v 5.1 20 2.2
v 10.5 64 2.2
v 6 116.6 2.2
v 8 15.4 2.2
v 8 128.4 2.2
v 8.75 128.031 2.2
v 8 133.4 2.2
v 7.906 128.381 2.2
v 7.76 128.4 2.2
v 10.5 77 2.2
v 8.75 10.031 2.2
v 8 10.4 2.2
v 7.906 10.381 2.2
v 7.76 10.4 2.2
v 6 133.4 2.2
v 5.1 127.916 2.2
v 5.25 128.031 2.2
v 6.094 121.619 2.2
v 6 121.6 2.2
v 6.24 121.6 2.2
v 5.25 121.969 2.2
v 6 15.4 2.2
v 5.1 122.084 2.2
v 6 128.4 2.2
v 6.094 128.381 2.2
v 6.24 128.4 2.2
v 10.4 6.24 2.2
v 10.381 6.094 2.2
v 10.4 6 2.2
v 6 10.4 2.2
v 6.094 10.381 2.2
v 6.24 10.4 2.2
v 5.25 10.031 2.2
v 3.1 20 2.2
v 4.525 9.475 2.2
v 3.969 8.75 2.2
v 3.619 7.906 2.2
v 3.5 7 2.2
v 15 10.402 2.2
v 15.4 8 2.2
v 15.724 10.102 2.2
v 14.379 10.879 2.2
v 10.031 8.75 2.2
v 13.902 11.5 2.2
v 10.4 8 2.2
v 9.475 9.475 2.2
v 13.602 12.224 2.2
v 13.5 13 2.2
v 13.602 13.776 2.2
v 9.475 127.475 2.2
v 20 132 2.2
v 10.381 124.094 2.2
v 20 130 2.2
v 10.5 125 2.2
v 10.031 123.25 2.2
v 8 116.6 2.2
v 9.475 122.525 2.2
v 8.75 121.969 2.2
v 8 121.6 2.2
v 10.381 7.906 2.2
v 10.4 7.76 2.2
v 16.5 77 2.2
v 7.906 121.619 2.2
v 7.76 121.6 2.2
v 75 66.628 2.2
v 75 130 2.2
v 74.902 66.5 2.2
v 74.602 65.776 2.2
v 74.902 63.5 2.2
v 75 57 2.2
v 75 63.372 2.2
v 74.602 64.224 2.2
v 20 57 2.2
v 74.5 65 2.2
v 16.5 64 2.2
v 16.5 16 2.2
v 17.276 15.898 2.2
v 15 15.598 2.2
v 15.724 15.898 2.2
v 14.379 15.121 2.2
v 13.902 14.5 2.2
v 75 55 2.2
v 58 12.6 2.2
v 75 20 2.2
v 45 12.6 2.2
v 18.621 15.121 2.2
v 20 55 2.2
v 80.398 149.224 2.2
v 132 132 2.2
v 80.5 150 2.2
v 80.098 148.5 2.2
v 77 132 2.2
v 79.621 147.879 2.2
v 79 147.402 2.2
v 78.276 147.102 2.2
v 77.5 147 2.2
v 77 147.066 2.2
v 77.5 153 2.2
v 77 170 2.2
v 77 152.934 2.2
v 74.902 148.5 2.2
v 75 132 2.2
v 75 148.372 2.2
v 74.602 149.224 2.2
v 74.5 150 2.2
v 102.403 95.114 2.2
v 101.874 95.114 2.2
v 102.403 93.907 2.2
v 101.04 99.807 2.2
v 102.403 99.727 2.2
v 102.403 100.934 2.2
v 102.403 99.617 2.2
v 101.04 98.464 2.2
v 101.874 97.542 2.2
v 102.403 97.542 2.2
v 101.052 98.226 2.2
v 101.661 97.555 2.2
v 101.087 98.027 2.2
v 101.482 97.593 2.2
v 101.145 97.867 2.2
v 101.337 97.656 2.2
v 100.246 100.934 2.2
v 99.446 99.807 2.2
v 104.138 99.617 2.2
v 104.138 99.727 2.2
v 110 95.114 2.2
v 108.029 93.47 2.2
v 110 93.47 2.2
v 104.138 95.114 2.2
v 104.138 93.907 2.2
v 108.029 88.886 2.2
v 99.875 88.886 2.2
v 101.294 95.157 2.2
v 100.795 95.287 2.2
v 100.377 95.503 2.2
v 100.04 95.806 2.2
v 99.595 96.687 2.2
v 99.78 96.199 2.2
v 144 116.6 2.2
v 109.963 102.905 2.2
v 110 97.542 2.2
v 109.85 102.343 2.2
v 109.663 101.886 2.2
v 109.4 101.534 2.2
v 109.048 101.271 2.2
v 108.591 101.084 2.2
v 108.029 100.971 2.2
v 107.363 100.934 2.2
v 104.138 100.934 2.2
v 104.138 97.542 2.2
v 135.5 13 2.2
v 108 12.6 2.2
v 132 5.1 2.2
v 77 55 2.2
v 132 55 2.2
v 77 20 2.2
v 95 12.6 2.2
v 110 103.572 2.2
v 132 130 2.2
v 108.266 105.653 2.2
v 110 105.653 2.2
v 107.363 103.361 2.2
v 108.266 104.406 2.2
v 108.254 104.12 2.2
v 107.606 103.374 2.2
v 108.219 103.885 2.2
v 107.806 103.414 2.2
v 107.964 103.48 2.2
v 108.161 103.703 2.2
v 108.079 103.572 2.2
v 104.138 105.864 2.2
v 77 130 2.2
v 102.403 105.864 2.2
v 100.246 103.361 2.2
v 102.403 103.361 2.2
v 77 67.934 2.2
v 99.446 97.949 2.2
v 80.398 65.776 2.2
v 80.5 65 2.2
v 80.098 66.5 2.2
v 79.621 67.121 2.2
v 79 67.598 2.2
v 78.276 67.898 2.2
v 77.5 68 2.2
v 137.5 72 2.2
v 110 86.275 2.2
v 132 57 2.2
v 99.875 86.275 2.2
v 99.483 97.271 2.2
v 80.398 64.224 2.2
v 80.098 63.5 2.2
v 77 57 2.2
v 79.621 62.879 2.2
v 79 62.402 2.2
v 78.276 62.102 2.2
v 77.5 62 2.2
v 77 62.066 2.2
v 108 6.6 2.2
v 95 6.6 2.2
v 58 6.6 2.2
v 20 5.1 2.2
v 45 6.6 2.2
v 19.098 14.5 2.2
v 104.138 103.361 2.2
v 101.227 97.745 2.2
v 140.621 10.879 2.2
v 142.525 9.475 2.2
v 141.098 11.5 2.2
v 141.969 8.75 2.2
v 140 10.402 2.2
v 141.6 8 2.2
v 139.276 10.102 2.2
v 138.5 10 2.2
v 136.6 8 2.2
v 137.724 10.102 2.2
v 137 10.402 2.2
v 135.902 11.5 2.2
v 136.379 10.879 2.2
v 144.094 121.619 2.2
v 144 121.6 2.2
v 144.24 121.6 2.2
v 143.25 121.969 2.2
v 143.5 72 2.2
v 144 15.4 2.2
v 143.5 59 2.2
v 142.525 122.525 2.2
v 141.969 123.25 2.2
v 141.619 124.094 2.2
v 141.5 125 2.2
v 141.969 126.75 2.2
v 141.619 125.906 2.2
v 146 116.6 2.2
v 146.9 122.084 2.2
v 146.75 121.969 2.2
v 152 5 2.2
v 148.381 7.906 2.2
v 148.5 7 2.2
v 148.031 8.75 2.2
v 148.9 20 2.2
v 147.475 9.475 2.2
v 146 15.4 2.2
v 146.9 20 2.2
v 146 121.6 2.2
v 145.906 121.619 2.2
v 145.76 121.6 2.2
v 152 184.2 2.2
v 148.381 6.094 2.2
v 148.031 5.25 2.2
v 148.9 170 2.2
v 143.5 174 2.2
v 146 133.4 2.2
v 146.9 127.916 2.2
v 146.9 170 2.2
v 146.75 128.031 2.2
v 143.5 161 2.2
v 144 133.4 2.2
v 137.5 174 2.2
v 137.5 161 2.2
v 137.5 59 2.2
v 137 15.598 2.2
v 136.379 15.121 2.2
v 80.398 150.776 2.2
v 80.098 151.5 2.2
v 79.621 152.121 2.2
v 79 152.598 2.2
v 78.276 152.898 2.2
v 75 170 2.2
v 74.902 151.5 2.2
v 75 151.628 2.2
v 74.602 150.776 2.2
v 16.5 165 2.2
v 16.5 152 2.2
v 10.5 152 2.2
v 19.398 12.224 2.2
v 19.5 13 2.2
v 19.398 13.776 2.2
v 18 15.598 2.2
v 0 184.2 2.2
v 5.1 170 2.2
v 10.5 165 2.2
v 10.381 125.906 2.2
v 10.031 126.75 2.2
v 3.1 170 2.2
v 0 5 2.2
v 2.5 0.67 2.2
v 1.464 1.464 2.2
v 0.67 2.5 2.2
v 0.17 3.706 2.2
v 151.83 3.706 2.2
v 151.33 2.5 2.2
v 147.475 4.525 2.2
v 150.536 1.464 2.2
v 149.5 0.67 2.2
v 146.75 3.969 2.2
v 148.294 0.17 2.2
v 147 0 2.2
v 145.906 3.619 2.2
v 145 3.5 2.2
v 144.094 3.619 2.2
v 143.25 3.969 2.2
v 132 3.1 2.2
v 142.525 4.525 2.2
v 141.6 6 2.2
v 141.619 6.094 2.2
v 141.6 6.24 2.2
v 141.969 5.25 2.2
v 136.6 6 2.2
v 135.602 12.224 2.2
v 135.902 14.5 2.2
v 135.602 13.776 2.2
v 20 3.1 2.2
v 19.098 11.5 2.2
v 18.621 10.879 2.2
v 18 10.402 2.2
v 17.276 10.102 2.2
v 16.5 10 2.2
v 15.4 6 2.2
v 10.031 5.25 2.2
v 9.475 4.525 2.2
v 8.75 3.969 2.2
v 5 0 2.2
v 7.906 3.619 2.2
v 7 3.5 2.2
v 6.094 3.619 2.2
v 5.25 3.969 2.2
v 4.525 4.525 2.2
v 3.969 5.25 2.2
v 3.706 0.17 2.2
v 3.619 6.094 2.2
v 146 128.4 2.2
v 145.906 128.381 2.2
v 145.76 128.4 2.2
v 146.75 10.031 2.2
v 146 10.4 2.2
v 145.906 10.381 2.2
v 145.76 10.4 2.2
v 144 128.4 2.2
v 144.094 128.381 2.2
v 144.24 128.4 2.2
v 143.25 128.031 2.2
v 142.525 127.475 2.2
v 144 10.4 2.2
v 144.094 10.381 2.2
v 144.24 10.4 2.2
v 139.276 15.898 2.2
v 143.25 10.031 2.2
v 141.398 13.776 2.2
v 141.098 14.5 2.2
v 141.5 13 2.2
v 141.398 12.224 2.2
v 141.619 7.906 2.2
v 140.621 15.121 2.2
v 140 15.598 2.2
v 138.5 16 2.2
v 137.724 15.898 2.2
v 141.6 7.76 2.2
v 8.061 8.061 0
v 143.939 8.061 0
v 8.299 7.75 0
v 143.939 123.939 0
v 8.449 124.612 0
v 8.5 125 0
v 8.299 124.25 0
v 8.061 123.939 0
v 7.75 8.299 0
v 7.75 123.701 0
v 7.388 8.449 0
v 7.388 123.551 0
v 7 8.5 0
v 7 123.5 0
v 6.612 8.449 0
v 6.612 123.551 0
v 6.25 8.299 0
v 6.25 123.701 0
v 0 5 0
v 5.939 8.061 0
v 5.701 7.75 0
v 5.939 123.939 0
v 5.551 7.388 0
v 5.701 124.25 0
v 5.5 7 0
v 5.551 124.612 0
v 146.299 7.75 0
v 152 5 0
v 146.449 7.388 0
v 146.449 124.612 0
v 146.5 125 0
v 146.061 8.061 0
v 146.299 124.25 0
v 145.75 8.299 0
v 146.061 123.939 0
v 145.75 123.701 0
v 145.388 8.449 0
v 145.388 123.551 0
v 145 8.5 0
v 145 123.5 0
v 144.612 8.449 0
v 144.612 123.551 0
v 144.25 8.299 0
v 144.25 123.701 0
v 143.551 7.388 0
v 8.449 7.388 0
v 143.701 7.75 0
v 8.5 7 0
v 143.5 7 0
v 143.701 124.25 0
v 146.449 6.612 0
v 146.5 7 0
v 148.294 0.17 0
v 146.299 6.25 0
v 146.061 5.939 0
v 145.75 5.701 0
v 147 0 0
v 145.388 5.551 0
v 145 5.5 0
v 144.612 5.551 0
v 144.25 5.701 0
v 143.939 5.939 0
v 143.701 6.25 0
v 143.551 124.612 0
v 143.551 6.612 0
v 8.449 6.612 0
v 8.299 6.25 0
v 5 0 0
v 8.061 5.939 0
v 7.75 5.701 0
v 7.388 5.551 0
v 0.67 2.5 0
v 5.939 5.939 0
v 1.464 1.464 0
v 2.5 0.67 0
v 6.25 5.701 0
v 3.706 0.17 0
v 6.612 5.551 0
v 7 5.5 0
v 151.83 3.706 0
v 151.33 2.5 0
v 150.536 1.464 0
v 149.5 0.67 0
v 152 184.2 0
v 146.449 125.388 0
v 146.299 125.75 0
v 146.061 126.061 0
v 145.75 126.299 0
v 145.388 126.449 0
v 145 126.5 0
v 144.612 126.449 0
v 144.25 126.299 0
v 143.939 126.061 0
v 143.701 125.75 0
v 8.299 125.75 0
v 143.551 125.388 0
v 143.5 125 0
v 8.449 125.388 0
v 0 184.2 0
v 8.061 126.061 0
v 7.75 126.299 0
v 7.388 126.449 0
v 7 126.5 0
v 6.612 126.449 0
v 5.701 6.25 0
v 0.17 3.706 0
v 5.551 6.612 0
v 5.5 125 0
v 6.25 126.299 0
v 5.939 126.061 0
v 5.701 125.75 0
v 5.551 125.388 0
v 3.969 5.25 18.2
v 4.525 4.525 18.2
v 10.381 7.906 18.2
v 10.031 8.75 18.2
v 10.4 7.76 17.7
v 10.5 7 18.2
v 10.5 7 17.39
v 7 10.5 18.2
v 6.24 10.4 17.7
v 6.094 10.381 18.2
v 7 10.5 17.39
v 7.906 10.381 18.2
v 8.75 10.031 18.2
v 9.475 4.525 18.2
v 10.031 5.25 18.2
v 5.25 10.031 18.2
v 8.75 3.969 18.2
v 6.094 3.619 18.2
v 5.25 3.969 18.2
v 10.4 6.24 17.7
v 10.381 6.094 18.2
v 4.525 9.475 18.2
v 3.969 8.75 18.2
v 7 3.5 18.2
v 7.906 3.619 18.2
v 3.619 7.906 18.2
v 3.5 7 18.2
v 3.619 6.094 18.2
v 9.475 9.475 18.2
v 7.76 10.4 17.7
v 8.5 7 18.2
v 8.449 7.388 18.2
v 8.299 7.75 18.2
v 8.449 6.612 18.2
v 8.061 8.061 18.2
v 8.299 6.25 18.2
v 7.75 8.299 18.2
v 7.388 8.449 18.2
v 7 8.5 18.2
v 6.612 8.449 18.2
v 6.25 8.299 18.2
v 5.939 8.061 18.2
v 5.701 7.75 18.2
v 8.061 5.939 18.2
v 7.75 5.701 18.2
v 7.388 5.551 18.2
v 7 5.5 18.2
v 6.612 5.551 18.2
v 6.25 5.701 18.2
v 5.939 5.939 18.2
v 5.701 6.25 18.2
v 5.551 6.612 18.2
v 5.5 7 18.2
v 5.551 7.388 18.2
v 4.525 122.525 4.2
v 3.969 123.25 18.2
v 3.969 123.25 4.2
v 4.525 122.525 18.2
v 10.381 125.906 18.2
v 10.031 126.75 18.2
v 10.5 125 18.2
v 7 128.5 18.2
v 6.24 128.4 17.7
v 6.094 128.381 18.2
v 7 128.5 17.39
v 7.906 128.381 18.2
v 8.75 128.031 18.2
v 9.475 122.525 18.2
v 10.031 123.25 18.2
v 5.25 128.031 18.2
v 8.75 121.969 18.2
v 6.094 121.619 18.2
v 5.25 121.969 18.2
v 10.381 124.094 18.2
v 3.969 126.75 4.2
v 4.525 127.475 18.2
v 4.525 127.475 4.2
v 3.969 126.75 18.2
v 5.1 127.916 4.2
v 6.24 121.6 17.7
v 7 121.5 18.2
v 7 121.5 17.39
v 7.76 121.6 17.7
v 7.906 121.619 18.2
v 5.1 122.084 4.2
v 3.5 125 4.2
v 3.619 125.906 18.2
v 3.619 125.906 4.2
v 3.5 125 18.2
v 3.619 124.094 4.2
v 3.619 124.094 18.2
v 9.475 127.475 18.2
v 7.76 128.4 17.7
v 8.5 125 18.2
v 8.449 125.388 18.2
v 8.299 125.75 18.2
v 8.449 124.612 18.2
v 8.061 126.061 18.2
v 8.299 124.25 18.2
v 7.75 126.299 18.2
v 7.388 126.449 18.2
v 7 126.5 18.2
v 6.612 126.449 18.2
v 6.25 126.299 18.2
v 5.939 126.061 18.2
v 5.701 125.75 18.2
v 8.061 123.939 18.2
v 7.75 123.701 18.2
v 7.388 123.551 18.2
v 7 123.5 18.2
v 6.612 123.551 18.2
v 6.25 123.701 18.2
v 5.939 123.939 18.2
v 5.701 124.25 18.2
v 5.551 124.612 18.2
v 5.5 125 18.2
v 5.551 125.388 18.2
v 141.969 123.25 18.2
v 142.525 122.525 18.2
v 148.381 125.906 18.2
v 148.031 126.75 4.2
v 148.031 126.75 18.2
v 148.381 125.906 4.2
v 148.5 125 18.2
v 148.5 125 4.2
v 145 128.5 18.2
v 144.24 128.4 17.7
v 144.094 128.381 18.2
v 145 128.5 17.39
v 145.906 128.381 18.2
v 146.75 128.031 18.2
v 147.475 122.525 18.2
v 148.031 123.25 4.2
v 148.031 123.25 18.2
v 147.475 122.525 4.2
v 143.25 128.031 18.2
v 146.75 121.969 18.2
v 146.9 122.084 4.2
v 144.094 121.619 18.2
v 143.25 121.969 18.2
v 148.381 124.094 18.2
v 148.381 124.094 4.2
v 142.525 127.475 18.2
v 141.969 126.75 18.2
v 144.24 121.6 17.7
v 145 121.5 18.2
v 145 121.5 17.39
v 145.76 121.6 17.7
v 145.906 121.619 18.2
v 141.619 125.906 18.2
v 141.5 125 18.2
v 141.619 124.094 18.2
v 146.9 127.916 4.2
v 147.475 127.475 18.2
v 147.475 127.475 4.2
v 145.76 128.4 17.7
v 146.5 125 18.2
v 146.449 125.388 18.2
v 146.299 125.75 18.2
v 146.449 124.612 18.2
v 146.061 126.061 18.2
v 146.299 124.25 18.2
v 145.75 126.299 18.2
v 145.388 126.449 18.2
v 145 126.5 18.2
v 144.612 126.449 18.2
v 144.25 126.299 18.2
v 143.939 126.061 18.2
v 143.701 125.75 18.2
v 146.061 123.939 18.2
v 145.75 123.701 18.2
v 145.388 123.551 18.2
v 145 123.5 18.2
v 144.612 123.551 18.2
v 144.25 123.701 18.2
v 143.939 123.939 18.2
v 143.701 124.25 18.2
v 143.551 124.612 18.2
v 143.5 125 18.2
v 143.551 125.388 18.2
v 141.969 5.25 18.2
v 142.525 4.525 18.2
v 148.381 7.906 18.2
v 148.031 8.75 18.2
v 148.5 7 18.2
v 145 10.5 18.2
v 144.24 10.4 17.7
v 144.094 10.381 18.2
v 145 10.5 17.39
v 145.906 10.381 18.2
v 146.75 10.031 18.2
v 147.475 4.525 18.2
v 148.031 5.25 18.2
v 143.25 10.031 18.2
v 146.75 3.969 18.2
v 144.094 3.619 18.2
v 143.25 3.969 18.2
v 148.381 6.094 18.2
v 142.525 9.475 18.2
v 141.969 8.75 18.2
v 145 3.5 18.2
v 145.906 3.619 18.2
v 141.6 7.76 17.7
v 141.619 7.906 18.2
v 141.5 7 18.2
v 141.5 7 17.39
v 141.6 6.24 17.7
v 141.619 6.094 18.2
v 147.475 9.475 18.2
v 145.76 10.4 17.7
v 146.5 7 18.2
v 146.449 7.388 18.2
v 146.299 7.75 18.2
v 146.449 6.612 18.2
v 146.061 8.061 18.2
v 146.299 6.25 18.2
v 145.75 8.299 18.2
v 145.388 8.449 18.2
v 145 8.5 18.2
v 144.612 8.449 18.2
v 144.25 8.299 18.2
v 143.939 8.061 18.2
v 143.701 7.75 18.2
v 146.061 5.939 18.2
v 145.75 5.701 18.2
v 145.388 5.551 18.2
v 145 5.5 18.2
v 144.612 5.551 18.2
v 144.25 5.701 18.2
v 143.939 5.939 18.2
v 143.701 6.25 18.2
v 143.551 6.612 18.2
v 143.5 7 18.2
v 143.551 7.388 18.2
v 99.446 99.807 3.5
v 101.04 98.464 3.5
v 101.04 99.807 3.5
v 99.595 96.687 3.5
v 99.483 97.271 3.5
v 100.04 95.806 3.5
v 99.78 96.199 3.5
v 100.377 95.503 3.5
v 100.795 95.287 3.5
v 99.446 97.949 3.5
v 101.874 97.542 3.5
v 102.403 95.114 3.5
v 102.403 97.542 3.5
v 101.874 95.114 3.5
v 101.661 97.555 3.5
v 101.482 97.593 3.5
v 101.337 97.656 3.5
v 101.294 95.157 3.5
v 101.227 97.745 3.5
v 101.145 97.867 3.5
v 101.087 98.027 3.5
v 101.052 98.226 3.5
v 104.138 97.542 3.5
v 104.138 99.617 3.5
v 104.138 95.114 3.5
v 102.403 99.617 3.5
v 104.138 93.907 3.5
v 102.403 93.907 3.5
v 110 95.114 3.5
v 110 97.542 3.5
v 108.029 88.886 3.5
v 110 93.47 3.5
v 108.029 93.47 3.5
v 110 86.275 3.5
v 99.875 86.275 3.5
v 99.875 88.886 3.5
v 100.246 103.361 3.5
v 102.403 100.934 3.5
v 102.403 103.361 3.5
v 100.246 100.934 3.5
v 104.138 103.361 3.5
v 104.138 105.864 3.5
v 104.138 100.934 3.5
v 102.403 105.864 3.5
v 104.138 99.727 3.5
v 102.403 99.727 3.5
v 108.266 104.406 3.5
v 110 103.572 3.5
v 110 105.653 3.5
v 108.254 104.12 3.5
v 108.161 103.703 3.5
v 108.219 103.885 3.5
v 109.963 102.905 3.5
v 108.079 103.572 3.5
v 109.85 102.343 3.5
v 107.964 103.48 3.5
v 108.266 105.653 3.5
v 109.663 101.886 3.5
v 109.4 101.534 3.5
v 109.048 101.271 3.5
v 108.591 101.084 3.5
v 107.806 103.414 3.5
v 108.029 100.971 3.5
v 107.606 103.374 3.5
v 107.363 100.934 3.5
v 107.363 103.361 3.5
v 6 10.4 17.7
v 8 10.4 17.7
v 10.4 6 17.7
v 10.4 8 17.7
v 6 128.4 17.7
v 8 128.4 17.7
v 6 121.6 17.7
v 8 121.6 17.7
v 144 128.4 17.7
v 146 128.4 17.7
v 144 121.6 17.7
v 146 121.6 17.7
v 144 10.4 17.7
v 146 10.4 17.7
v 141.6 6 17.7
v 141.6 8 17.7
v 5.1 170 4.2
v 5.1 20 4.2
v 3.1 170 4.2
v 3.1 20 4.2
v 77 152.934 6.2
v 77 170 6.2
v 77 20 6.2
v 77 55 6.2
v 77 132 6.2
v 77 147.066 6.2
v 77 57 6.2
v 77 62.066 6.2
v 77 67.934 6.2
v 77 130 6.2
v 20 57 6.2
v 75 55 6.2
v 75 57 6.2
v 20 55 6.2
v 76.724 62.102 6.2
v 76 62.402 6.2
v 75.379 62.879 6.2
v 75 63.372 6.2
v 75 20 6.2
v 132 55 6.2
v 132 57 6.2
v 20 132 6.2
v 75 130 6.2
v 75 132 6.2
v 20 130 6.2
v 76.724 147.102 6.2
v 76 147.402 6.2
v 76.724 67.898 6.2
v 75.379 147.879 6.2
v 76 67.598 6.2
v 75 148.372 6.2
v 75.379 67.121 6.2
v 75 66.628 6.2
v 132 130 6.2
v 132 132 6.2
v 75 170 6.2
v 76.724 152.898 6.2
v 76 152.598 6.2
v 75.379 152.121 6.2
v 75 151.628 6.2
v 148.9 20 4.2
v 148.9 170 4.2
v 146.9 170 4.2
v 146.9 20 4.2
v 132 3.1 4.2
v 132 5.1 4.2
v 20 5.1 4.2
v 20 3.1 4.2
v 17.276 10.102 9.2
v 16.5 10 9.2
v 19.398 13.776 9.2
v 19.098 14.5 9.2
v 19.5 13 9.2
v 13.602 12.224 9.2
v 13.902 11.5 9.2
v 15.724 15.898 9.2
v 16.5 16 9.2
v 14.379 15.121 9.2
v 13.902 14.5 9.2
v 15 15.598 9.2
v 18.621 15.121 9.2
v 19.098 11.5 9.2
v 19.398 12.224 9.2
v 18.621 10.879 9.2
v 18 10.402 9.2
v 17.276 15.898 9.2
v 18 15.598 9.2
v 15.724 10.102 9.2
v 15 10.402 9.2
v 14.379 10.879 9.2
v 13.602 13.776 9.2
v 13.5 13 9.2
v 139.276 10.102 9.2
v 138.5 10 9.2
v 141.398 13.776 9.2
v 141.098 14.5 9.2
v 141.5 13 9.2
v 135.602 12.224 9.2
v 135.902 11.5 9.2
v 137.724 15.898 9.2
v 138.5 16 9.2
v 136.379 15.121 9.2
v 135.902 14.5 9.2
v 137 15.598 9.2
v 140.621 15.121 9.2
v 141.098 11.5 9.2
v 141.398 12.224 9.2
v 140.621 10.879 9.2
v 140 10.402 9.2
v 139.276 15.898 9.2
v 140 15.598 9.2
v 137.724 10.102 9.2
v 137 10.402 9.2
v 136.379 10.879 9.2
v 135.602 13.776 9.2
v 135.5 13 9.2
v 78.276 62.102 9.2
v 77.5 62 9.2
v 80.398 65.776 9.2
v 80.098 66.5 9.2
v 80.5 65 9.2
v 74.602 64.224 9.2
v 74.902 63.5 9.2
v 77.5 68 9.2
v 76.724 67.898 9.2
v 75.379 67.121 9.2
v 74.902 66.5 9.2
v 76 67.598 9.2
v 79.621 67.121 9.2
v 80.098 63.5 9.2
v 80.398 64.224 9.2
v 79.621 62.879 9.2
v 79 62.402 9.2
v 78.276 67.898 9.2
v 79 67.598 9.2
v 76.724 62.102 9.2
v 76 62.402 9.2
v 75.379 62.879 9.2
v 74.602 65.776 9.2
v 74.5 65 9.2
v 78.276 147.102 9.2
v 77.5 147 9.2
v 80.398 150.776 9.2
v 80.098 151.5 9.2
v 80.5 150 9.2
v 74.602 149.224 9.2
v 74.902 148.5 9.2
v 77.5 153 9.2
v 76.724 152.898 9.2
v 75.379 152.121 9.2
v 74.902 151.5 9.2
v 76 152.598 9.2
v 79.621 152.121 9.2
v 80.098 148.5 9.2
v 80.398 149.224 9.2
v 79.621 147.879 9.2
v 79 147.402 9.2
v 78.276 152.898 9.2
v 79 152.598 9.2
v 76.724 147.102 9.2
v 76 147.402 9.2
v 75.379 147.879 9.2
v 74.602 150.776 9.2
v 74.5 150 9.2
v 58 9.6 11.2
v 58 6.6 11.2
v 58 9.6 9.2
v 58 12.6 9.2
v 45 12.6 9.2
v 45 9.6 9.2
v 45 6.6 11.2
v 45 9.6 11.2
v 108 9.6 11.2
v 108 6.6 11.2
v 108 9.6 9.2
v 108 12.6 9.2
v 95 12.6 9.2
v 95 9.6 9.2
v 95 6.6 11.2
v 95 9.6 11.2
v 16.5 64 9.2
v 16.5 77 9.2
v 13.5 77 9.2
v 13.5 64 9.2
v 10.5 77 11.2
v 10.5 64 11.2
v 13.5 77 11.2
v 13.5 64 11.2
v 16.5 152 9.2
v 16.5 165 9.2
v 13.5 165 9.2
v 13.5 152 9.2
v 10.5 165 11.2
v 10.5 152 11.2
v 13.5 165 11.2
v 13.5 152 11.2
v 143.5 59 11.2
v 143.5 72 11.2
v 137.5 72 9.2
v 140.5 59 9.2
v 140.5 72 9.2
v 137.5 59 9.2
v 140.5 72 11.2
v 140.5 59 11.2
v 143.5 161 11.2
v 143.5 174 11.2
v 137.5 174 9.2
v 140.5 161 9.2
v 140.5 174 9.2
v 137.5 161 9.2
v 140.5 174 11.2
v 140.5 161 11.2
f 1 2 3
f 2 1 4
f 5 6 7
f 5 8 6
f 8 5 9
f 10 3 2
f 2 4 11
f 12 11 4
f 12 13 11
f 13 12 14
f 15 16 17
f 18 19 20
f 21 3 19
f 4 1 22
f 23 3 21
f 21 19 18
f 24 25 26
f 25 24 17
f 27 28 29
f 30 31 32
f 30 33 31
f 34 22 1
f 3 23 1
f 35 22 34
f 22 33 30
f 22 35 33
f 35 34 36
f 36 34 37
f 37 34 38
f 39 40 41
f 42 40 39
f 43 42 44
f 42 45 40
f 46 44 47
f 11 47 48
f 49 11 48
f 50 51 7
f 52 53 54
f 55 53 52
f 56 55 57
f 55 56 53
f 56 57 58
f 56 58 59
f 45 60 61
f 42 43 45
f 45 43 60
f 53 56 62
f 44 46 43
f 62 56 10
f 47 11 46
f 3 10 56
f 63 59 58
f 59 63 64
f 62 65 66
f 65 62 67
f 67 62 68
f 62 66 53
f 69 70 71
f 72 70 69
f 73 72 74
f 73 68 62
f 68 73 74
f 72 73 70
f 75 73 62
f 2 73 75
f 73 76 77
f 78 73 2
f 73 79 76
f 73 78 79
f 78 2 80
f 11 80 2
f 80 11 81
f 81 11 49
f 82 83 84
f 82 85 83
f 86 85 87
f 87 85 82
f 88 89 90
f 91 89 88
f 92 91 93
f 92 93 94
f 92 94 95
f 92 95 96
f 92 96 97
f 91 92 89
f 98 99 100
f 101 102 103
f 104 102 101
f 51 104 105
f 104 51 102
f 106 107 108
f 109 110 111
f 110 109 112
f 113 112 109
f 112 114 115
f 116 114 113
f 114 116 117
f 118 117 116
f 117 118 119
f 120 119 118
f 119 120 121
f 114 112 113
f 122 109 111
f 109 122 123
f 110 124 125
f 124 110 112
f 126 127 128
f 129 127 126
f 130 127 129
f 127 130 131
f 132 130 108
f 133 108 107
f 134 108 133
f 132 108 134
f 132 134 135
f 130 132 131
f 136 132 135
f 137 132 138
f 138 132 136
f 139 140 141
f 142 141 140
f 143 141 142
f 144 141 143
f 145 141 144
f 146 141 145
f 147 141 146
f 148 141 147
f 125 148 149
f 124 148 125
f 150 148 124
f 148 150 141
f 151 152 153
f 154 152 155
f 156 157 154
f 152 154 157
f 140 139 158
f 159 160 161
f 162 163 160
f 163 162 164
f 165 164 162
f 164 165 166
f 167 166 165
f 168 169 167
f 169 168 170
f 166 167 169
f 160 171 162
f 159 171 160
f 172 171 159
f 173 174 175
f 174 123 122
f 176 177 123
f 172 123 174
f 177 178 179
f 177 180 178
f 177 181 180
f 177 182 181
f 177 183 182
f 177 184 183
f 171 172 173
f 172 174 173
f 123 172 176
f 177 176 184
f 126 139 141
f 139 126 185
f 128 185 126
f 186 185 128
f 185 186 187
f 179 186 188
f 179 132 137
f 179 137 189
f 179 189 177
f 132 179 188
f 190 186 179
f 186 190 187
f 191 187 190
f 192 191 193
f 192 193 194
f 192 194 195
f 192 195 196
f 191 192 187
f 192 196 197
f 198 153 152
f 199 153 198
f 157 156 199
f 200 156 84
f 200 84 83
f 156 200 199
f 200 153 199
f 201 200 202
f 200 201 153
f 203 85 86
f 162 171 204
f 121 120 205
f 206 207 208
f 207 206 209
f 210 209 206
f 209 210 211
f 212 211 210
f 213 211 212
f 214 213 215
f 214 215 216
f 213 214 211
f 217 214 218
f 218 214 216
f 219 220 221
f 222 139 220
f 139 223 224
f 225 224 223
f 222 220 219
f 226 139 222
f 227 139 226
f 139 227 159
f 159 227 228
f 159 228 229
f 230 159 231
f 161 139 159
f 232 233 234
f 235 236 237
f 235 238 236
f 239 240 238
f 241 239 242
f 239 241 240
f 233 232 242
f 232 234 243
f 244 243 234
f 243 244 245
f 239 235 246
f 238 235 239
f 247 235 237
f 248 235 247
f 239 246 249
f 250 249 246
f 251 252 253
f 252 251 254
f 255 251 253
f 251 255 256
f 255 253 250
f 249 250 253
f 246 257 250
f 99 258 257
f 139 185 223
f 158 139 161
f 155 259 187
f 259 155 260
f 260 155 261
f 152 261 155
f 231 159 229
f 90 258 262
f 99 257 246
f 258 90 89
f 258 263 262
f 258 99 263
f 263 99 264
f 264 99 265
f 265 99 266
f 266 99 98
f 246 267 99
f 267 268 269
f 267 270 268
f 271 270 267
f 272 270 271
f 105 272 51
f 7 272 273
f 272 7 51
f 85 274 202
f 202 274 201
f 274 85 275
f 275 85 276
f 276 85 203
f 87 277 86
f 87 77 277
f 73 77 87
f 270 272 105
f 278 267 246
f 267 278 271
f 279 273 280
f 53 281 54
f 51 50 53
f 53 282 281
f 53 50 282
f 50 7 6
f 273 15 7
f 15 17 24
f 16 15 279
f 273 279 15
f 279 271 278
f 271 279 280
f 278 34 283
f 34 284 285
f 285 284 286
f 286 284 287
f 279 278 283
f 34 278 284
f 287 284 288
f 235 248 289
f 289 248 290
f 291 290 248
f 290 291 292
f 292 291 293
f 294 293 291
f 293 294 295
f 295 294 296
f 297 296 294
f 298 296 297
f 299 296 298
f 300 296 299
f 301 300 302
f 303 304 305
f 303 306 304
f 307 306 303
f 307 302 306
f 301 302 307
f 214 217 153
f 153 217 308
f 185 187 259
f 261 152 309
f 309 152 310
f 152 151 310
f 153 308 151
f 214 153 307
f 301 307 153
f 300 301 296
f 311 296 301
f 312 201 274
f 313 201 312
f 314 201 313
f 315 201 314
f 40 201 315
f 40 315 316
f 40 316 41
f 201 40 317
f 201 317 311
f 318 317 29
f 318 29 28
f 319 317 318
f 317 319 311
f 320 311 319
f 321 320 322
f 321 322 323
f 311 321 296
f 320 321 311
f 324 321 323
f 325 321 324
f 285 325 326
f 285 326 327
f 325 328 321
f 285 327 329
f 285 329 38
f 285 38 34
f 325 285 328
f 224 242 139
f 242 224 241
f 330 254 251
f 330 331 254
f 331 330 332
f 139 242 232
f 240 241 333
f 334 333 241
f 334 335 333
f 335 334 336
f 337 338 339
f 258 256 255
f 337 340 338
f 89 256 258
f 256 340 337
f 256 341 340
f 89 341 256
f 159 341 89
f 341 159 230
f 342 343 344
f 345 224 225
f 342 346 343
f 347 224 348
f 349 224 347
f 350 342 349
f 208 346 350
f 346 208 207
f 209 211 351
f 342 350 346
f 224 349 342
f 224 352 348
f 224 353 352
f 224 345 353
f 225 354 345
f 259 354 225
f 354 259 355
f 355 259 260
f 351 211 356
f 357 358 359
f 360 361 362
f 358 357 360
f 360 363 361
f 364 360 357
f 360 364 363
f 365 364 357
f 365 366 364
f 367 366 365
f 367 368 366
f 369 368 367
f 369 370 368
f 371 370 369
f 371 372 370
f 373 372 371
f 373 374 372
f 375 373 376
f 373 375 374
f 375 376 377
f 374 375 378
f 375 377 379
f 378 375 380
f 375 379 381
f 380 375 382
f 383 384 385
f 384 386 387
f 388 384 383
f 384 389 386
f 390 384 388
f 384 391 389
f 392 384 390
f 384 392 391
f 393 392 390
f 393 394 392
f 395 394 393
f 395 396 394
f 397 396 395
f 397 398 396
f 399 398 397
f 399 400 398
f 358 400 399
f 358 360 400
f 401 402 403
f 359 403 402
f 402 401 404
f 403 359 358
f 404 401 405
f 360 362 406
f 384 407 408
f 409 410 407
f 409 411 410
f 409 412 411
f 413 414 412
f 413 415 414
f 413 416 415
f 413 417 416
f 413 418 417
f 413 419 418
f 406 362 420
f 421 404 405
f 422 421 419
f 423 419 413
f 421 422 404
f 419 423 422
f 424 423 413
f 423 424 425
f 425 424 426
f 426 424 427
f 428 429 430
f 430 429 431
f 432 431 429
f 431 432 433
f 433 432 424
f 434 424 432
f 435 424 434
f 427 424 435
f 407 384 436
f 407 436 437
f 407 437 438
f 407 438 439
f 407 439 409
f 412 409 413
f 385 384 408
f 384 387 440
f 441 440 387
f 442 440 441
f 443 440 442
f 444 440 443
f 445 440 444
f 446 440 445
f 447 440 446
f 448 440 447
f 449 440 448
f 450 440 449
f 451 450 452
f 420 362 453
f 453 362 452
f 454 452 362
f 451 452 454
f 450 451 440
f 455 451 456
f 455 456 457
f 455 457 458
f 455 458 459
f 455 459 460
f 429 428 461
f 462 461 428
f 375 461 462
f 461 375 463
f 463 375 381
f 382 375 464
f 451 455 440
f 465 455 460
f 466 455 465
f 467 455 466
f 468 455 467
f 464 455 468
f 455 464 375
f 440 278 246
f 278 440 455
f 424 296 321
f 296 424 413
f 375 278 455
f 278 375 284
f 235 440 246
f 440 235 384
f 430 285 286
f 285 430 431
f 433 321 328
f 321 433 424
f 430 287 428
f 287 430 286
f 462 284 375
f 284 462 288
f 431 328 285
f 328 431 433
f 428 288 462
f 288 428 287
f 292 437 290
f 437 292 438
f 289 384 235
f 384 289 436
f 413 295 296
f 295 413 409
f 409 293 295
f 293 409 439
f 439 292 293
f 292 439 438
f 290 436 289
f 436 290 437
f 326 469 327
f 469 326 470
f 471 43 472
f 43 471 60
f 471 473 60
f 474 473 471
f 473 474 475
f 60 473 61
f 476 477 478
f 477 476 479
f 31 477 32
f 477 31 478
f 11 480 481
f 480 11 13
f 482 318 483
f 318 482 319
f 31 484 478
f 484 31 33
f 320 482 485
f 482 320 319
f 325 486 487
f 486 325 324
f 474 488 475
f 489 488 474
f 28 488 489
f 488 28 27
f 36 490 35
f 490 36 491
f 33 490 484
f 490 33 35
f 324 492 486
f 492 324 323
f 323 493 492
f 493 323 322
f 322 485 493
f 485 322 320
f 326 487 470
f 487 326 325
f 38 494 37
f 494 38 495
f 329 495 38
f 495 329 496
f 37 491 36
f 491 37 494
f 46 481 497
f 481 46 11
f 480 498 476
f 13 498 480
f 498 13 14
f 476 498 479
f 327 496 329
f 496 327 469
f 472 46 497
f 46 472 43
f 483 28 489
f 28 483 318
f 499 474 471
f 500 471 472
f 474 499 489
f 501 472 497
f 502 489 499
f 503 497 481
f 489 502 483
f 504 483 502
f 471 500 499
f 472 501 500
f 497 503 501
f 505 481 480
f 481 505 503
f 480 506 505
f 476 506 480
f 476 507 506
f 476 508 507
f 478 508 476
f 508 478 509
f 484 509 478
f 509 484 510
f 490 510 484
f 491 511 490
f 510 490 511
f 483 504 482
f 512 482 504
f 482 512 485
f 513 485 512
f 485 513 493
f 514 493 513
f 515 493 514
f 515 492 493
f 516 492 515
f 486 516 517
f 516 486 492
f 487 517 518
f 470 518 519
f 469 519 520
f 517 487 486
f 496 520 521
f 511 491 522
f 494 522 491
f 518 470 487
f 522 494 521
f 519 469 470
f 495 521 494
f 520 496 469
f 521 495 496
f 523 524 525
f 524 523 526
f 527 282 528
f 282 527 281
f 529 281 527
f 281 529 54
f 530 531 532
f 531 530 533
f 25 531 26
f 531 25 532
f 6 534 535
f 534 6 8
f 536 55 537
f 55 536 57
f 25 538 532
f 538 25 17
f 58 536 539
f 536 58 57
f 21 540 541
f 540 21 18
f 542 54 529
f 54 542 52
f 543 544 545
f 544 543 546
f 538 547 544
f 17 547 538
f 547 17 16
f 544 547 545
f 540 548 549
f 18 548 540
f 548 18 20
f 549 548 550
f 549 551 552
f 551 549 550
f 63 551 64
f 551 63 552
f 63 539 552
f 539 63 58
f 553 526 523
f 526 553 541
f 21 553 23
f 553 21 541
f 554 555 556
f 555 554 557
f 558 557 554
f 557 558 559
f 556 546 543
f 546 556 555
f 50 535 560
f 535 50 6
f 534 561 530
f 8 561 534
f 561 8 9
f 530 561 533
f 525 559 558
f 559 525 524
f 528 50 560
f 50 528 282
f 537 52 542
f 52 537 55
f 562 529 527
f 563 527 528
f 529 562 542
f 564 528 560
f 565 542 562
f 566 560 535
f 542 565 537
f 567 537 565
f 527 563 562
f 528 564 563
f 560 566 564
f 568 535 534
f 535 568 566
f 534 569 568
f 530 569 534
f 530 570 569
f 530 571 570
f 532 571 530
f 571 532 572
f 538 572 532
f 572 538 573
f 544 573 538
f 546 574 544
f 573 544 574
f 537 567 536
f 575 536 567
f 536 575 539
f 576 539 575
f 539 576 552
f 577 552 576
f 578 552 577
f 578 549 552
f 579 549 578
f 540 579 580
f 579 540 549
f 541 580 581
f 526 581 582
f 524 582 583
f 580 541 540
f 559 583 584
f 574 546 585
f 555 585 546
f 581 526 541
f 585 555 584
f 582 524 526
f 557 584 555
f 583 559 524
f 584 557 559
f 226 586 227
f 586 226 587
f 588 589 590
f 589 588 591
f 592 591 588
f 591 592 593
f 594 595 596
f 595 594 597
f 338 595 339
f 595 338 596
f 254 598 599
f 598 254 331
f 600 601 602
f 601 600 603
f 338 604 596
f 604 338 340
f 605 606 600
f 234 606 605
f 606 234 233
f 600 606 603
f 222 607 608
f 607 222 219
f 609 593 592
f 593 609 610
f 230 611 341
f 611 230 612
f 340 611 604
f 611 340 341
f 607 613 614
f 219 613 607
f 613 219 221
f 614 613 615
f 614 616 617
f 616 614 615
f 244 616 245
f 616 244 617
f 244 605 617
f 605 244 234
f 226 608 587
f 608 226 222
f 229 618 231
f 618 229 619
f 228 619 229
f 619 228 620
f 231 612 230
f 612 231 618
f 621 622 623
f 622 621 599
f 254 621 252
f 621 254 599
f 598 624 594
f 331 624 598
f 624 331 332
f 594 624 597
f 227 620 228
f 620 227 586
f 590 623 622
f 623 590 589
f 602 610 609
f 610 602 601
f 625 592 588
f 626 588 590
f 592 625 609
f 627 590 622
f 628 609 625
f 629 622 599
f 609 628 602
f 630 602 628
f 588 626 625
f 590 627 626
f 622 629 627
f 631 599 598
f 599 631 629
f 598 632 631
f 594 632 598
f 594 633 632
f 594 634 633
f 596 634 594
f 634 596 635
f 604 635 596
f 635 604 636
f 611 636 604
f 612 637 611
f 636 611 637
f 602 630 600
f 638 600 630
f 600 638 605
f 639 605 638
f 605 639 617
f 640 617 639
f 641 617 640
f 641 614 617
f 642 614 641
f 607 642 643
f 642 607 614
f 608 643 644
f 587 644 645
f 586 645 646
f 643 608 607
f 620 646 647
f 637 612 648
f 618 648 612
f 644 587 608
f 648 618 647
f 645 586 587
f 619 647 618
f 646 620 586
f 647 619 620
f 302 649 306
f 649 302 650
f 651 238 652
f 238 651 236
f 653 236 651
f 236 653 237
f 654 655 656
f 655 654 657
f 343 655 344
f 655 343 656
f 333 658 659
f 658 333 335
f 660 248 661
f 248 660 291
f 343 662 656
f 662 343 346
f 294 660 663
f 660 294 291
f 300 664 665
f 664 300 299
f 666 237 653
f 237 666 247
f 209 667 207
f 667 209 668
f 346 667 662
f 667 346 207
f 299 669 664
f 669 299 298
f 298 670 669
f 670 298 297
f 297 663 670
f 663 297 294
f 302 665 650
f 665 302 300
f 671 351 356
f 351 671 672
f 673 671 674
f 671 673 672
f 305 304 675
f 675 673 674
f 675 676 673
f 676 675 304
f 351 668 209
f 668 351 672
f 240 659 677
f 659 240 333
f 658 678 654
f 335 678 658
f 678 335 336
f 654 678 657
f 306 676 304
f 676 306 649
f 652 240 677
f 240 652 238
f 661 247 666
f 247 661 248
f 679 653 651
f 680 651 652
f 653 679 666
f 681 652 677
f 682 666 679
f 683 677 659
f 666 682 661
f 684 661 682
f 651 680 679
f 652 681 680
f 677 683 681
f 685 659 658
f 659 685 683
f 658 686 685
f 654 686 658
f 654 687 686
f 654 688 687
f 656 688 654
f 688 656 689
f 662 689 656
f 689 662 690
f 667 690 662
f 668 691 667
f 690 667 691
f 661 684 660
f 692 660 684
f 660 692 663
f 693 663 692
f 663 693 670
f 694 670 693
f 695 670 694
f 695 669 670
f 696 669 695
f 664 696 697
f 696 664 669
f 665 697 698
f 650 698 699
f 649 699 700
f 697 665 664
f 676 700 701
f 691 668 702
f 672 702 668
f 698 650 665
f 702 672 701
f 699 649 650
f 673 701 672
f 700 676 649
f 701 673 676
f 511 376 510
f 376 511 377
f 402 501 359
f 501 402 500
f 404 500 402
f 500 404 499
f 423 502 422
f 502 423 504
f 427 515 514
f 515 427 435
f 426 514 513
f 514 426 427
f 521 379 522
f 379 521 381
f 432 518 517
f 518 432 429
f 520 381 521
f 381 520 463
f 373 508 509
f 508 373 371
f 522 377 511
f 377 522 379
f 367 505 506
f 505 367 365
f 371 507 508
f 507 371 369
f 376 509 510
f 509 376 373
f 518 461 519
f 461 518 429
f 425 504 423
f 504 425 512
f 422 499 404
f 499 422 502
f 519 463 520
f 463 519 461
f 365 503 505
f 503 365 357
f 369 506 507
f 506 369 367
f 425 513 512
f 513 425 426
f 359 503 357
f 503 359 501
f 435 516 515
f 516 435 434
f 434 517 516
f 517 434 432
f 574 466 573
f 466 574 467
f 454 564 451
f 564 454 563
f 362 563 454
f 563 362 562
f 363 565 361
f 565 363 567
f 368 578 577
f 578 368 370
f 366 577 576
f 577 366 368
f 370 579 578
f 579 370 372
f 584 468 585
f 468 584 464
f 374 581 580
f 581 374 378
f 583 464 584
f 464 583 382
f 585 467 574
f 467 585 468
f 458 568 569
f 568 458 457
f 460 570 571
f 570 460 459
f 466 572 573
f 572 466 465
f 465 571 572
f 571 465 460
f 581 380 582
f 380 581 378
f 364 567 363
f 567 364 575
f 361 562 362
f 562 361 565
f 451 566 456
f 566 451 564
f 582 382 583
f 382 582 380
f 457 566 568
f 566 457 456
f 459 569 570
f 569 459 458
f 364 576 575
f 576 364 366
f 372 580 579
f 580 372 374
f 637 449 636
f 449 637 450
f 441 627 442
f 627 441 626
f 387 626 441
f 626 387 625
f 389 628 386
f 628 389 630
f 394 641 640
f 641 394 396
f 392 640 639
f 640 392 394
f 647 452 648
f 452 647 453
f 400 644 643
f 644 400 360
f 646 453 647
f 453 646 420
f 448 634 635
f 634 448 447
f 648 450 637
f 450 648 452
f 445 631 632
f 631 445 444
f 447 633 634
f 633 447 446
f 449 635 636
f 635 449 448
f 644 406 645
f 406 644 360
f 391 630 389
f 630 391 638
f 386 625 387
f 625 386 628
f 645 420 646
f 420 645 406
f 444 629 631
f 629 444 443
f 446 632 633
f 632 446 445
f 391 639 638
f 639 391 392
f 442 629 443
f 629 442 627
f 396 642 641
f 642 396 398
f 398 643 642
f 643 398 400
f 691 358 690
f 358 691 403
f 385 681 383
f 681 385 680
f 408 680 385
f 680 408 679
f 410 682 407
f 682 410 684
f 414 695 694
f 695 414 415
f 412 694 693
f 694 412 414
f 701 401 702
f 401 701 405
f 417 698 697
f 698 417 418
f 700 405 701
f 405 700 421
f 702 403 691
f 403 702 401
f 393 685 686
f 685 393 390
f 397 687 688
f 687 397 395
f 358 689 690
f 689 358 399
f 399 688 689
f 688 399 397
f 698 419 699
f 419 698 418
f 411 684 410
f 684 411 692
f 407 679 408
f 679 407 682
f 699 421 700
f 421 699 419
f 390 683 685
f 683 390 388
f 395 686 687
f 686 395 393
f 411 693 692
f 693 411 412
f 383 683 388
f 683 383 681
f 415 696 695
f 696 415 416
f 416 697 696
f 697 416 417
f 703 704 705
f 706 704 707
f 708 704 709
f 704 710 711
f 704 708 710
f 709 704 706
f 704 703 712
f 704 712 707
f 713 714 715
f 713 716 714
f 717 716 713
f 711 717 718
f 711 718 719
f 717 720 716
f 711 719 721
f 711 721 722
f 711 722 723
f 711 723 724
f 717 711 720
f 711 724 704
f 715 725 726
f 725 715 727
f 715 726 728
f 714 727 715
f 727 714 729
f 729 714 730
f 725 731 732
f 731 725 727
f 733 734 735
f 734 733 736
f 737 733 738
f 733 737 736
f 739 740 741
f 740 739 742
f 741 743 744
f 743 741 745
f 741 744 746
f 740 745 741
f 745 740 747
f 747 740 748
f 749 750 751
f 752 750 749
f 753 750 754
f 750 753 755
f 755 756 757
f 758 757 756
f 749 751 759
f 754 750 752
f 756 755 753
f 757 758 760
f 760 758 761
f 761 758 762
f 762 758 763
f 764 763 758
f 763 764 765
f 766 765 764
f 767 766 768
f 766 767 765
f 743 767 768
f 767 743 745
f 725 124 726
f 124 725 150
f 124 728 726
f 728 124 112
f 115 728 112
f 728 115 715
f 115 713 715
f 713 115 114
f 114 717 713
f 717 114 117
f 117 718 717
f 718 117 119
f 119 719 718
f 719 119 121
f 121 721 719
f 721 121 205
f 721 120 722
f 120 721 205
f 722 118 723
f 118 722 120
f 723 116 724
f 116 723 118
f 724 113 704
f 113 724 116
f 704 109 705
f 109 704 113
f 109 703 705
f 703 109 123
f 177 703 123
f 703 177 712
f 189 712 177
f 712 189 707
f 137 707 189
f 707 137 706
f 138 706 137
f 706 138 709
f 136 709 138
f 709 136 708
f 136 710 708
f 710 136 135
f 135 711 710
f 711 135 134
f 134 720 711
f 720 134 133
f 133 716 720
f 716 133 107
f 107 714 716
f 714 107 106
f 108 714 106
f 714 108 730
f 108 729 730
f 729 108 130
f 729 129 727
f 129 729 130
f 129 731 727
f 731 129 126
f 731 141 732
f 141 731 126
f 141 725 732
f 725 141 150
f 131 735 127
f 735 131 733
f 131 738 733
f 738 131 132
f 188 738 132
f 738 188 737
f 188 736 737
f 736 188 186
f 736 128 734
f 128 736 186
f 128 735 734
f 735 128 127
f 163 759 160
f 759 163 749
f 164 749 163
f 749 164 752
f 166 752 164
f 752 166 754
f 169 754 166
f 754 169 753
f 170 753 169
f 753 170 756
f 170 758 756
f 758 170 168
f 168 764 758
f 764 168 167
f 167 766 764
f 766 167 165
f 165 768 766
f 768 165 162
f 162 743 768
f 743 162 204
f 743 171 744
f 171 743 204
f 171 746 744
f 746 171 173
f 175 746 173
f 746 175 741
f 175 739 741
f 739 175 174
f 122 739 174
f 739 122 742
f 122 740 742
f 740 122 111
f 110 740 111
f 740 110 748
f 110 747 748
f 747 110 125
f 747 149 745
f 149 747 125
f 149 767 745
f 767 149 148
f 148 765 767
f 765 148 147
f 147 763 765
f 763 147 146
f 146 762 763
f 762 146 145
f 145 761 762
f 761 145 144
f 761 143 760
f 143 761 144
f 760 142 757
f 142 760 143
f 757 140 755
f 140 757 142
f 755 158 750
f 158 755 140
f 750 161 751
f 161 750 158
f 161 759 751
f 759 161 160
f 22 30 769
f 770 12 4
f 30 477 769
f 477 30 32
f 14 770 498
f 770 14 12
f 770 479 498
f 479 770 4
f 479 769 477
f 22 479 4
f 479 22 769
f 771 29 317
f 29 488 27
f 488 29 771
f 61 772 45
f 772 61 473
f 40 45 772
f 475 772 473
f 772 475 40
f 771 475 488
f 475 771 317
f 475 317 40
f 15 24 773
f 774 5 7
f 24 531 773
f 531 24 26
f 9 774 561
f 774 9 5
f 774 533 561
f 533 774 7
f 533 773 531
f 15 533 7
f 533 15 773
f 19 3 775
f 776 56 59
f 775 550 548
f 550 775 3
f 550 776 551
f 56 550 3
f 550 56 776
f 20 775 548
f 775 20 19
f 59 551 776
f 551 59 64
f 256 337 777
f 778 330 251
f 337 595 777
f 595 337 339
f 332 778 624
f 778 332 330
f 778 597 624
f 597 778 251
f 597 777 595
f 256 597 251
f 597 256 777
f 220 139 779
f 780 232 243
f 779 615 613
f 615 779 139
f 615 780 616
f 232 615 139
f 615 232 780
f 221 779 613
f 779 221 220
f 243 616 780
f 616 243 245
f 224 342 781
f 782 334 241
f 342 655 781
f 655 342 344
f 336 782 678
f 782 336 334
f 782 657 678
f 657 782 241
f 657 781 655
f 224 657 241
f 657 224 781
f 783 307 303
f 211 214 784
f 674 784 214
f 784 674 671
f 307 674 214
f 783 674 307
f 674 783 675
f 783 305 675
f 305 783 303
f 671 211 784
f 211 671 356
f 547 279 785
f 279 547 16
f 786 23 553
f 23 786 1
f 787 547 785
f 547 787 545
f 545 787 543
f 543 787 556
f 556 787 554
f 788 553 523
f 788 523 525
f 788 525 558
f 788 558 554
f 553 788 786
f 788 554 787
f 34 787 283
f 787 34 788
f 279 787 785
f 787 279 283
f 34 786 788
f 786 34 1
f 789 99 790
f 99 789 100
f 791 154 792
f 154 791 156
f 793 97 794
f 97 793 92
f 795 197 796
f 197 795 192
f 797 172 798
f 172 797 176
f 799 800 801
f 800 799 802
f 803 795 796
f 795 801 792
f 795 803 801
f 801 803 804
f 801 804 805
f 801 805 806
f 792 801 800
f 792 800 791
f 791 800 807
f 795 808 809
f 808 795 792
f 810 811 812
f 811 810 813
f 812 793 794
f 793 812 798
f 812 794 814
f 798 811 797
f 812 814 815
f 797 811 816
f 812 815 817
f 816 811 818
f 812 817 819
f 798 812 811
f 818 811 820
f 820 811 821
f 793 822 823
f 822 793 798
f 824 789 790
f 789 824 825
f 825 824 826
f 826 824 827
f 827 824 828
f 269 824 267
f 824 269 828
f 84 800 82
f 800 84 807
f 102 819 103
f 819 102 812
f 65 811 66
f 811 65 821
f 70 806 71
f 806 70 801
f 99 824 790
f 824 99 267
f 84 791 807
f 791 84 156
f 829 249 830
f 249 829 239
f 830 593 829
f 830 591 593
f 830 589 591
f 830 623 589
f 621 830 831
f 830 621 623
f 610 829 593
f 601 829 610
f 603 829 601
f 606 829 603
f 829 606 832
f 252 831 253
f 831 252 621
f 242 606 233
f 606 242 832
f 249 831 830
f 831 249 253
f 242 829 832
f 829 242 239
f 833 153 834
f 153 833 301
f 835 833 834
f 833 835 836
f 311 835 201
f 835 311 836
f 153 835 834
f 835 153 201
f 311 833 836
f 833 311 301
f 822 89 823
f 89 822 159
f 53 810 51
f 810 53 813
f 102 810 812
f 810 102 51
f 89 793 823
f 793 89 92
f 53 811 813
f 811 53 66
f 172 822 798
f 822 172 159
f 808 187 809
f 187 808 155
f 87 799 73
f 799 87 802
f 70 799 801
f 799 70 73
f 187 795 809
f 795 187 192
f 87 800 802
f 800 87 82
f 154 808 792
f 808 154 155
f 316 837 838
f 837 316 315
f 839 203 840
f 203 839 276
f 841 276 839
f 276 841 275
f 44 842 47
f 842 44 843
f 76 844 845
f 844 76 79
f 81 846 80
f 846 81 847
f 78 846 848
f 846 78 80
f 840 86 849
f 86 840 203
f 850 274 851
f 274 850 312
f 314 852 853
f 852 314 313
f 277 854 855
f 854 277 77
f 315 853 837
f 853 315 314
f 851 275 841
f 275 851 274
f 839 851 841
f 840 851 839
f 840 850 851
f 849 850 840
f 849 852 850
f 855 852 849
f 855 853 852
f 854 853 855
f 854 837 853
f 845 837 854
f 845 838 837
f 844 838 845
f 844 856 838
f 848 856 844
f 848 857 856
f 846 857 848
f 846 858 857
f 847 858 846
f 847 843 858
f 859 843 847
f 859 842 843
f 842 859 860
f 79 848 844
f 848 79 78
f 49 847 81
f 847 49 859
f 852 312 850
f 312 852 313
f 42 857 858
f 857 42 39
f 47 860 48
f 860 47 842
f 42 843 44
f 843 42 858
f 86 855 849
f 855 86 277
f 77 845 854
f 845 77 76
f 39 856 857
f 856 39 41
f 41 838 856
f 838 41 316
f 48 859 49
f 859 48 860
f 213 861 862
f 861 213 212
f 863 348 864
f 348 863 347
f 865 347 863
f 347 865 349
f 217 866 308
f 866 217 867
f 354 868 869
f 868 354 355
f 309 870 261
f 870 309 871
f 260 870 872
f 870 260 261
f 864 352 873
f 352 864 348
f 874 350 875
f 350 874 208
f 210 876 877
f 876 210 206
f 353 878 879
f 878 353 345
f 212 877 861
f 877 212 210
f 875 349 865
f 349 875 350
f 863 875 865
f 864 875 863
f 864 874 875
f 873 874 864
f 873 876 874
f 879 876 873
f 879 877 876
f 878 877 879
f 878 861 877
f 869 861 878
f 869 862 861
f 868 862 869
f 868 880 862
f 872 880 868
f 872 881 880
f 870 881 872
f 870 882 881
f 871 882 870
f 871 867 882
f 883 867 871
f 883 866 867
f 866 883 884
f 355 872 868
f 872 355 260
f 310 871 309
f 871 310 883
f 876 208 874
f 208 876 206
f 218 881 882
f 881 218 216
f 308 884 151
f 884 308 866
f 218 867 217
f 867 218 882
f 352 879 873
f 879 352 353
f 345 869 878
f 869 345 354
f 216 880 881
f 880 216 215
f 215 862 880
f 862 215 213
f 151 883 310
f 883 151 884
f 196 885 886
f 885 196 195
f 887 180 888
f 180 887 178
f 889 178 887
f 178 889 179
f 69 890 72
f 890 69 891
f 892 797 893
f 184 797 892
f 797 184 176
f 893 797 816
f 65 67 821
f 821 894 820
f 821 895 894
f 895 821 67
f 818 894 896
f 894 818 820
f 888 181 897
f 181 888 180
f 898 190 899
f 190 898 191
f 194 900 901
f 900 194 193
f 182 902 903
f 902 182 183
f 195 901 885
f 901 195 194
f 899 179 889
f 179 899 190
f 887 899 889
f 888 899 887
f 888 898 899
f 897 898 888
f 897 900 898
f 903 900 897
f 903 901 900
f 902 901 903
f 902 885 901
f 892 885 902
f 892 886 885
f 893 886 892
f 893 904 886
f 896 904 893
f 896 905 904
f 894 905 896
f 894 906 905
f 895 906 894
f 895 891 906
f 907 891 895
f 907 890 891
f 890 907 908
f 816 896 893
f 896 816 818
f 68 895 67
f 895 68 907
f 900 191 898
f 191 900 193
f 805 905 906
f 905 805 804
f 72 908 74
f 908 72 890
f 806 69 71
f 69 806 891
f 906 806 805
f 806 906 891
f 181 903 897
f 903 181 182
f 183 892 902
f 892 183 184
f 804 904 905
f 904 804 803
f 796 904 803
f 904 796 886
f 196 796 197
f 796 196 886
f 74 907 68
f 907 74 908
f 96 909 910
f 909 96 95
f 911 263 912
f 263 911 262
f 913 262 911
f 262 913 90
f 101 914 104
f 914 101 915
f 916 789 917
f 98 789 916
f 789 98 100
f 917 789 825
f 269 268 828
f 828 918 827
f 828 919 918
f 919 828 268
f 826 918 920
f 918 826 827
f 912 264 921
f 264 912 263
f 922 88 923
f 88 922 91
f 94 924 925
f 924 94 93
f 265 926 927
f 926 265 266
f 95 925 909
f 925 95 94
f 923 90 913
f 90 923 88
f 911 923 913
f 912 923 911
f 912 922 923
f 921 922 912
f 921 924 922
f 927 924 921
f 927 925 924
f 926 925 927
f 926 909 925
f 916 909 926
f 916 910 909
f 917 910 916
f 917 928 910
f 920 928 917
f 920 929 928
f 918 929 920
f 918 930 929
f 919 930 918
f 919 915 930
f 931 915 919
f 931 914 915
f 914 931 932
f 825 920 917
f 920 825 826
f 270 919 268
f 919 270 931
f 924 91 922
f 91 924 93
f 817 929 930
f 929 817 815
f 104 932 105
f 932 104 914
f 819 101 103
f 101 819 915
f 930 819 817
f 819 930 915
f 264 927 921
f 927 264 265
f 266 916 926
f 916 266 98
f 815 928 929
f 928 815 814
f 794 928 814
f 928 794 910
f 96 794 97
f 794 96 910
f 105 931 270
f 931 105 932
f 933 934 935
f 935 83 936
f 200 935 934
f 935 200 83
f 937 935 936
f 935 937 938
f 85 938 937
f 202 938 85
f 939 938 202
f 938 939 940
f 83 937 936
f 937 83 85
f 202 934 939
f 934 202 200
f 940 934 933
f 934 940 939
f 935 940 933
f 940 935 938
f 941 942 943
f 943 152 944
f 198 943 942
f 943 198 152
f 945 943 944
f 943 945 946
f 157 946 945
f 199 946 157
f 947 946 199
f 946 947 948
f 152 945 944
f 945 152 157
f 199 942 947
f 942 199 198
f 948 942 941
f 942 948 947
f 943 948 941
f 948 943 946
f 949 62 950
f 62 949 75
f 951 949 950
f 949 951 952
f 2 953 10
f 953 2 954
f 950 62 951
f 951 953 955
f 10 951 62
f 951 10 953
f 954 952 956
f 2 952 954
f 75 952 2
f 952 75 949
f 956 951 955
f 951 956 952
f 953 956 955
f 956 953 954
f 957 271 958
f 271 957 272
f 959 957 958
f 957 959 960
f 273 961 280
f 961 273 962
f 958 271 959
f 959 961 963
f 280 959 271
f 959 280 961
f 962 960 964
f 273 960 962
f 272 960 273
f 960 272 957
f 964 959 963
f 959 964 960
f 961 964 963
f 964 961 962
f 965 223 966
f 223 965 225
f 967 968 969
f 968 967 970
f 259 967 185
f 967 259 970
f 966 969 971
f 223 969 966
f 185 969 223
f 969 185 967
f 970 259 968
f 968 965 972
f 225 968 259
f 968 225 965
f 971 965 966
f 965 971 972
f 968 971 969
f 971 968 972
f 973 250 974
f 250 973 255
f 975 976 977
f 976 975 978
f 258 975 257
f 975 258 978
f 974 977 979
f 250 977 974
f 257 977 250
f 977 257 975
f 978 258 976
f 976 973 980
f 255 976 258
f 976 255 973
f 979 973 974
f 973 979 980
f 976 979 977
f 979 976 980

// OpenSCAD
//TXT
translate([110,85,0])
rotate([0,0,90])
linear_extrude(3.5)
text("Lft",size=10,font="Open Sans:style=bold");
//BASE
$fn=24;
//Deck and Towers
difference() {
    union() {
        translate([5,5,0])
            cube([142,179.2,2.2]);
        translate([5,0,0])
            cube([142,5,2.2]);
        translate([0,5,0])
            cube([5,179.2,2.2]);
        translate([147,5,0])
            cube([5,179.2,2.2]);    
        translate([5,5,0])
            cylinder(h=2.2,r1=5,r2=5);
        translate([147,5,0])
            cylinder(h=2.2,r1=5,r2=5);
        translate([7,7,0])
            cylinder(h=18.2,r1=3.5,r2=3.5);
        translate([7,125,0])
            cylinder(h=18.2,r1=3.5,r2=3.5);
        translate([145,125,0])
            cylinder(h=18.2,r1=3.5,r2=3.5);
        translate([145,7,0])
            cylinder(h=18.2,r1=3.5,r2=3.5);
    }
    translate([7,7,-4])
        cylinder(d=3,h=26);
    translate([7,125,-4])
        cylinder(d=3,h=26);
    translate([145,125,-4])
        cylinder(d=3,h=26);
    translate([145,7,-4])
        cylinder(d=3,h=26);
}
//Tower Supports
//Trigon0Y
translate([6,10.4,2.2])
    {TrigonPoints = [
    [0,0,0],//0
    [0,5,0],//1
    [0,0,15.5],//2
    [2,0,0],//3
    [2,5,0],//4
    [2,0,15.5]];//5
    TrigonFaces = [
    [0,1,2],//outside
    [0,3,4,1],//bottom
    [0,2,5,3],//top    
    [2,1,4,5],//back
    [3,5,4]];//inside
polyhedron(TrigonPoints,TrigonFaces);}
//Trigon0Yright
translate([10.4,6,2.2])
    {TrigonPoints = [
    [0,0,0],//0
    [5,0,0],//1
    [0,0,15.5],//2
    [0,2,0],//3
    [5,2,0],//4
    [0,2,15.5]]; //5
    TrigonFaces = [
    [0,2,1],//outside
    [0,1,4,3],//bottom
    [0,3,5,2],//top
    [1,2,5,4],//back
    [3,4,5]];//inside
polyhedron(TrigonPoints,TrigonFaces);}//
//Trigon1Y
translate([6,128.4,2.2])
    {TrigonPoints = [
    [0,0,0],//0
    [0,5,0],//1
    [0,0,15.5],//2
    [2,0,0],//3
    [2,5,0],//4
    [2,0,15.5]];//5
    TrigonFaces = [
    [0,1,2],//outside
    [0,3,4,1],//bottom
    [0,2,5,3],//top
    [2,1,4,5],//back
    [3,5,4]];//inside
polyhedron(TrigonPoints,TrigonFaces);}
//Trigon1Yrev
translate([6,116.6,2.2])
    {TrigonPoints = [
    [0,0,0],//0
    [0,5,0],//1
    [0,5,15.5],//2
    [2,0,0],//3
    [2,5,0],//4
    [2,5,15.5]]; //5
    TrigonFaces = [
    [0,1,2],//outside
    [0,3,4,1],//bottom
    [0,2,5,3],//top
    [1,4,5,2],//back
    [3,5,4]];//inside
polyhedron(TrigonPoints,TrigonFaces);}
//Trigon2Y
translate([144,128.4,2.2])
    {TrigonPoints = [
    [0,0,0],//0
    [0,5,0],//1
    [0,0,15.5],//2
    [2,0,0],//3
    [2,5,0],//4
    [2,0,15.5]]; //5
    TrigonFaces = [
    [0,1,2],//outside
    [0,3,4,1],//bottom
    [0,2,5,3],//top
    [2,1,4,5],//back
    [3,5,4]];//inside
polyhedron(TrigonPoints,TrigonFaces);}
//Trigon2Yrev
translate([144,116.6,2.2])
    {TrigonPoints = [
    [0,0,0],//0
    [0,5,0],//1
    [0,5,15.5],//2
    [2,0,0],//3
    [2,5,0],//4
    [2,5,15.5]]; //5
    TrigonFaces = [
    [0,1,2],//outside
    [0,3,4,1],//bottom
    [0,2,5,3],//top
    [1,4,5,2],//back
    [3,5,4]];//inside
polyhedron(TrigonPoints,TrigonFaces);}
//Trigon3Y
translate([144,10.4,2.2])
    {TrigonPoints = [
    [0,0,0],//0
    [0,5,0],//1
    [0,0,15.5],//2
    [2,0,0],//3
    [2,5,0],//4
    [2,0,15.5]]; //5
    TrigonFaces = [
    [0,1,2],//outside
    [0,3,4,1],//bottom
    [0,2,5,3],//top
    [2,1,4,5],//back
    [3,5,4]];//inside
polyhedron(TrigonPoints,TrigonFaces);}
//Trigon3Yleft
translate([136.6,6,2.2])
    {TrigonPoints = [
    [0,0,0],//0
    [5,0,0],//1
    [5,0,15.5],//2
    [0,2,0],//3
    [5,2,0],//4
    [5,2,15.5]]; //5
    TrigonFaces = [
    [0,2,1],//outside
    [0,1,4,3],//bottom
    [0,3,5,2],//top
    [1,2,5,4],//back
    [3,4,5]];//inside
polyhedron(TrigonPoints,TrigonFaces);}
//Ribs
translate([3.1,20,2.2])
    cube([2,150,2]);
translate([75,20,2.2])
    cube([2,150,4]);
translate([146.9,20,2.2])
    cube([2,150,2]);
translate([20,3.1,2.2])
    cube([112,2,2]);
translate([20,130,2.2])
    cube([112,2,4]);
translate([20,55,2.2])
    cube([112,2,4]);
//Corner and Mid Supports
translate([16.5,13,2.2])
    cylinder(h=7,r1=3,r2=3);
translate([138.5,13,2.2])
    cylinder(h=7,r1=3,r2=3);
translate([77.5,65,2.2])
    cylinder(h=7,r1=3,r2=3);
translate([77.5,150,2.2])
    cylinder(h=7,r1=3,r2=3);
//PCB Side
translate([45,6.6,2.2])
    cube([13,6,7]);
translate([45,6.6,9.2])
    cube([13,3,2]);
translate([95,6.6,2.2])
    cube([13,6,7]);
translate([95,6.6,9.2])
    cube([13,3,2]);
//PCB Top Left
translate([10.5,64,2.2])
    cube([6,13,7]);
translate([10.5,64,9.2])
    cube([3,13,2]);
translate([10.5,152,2.2])
    cube([6,13,7]);
translate([10.5,152,9.2])
    cube([3,13,2]);
//PCB Bottom Left
translate([137.5,59,2.2])
    cube([6,13,7]);
translate([140.5,59,9.2])
    cube([3,13,2]);
translate([137.5,161,2.2])
    cube([6,13,7]);
translate([140.5,161,9.2])
    cube([3,13,2]);
    
